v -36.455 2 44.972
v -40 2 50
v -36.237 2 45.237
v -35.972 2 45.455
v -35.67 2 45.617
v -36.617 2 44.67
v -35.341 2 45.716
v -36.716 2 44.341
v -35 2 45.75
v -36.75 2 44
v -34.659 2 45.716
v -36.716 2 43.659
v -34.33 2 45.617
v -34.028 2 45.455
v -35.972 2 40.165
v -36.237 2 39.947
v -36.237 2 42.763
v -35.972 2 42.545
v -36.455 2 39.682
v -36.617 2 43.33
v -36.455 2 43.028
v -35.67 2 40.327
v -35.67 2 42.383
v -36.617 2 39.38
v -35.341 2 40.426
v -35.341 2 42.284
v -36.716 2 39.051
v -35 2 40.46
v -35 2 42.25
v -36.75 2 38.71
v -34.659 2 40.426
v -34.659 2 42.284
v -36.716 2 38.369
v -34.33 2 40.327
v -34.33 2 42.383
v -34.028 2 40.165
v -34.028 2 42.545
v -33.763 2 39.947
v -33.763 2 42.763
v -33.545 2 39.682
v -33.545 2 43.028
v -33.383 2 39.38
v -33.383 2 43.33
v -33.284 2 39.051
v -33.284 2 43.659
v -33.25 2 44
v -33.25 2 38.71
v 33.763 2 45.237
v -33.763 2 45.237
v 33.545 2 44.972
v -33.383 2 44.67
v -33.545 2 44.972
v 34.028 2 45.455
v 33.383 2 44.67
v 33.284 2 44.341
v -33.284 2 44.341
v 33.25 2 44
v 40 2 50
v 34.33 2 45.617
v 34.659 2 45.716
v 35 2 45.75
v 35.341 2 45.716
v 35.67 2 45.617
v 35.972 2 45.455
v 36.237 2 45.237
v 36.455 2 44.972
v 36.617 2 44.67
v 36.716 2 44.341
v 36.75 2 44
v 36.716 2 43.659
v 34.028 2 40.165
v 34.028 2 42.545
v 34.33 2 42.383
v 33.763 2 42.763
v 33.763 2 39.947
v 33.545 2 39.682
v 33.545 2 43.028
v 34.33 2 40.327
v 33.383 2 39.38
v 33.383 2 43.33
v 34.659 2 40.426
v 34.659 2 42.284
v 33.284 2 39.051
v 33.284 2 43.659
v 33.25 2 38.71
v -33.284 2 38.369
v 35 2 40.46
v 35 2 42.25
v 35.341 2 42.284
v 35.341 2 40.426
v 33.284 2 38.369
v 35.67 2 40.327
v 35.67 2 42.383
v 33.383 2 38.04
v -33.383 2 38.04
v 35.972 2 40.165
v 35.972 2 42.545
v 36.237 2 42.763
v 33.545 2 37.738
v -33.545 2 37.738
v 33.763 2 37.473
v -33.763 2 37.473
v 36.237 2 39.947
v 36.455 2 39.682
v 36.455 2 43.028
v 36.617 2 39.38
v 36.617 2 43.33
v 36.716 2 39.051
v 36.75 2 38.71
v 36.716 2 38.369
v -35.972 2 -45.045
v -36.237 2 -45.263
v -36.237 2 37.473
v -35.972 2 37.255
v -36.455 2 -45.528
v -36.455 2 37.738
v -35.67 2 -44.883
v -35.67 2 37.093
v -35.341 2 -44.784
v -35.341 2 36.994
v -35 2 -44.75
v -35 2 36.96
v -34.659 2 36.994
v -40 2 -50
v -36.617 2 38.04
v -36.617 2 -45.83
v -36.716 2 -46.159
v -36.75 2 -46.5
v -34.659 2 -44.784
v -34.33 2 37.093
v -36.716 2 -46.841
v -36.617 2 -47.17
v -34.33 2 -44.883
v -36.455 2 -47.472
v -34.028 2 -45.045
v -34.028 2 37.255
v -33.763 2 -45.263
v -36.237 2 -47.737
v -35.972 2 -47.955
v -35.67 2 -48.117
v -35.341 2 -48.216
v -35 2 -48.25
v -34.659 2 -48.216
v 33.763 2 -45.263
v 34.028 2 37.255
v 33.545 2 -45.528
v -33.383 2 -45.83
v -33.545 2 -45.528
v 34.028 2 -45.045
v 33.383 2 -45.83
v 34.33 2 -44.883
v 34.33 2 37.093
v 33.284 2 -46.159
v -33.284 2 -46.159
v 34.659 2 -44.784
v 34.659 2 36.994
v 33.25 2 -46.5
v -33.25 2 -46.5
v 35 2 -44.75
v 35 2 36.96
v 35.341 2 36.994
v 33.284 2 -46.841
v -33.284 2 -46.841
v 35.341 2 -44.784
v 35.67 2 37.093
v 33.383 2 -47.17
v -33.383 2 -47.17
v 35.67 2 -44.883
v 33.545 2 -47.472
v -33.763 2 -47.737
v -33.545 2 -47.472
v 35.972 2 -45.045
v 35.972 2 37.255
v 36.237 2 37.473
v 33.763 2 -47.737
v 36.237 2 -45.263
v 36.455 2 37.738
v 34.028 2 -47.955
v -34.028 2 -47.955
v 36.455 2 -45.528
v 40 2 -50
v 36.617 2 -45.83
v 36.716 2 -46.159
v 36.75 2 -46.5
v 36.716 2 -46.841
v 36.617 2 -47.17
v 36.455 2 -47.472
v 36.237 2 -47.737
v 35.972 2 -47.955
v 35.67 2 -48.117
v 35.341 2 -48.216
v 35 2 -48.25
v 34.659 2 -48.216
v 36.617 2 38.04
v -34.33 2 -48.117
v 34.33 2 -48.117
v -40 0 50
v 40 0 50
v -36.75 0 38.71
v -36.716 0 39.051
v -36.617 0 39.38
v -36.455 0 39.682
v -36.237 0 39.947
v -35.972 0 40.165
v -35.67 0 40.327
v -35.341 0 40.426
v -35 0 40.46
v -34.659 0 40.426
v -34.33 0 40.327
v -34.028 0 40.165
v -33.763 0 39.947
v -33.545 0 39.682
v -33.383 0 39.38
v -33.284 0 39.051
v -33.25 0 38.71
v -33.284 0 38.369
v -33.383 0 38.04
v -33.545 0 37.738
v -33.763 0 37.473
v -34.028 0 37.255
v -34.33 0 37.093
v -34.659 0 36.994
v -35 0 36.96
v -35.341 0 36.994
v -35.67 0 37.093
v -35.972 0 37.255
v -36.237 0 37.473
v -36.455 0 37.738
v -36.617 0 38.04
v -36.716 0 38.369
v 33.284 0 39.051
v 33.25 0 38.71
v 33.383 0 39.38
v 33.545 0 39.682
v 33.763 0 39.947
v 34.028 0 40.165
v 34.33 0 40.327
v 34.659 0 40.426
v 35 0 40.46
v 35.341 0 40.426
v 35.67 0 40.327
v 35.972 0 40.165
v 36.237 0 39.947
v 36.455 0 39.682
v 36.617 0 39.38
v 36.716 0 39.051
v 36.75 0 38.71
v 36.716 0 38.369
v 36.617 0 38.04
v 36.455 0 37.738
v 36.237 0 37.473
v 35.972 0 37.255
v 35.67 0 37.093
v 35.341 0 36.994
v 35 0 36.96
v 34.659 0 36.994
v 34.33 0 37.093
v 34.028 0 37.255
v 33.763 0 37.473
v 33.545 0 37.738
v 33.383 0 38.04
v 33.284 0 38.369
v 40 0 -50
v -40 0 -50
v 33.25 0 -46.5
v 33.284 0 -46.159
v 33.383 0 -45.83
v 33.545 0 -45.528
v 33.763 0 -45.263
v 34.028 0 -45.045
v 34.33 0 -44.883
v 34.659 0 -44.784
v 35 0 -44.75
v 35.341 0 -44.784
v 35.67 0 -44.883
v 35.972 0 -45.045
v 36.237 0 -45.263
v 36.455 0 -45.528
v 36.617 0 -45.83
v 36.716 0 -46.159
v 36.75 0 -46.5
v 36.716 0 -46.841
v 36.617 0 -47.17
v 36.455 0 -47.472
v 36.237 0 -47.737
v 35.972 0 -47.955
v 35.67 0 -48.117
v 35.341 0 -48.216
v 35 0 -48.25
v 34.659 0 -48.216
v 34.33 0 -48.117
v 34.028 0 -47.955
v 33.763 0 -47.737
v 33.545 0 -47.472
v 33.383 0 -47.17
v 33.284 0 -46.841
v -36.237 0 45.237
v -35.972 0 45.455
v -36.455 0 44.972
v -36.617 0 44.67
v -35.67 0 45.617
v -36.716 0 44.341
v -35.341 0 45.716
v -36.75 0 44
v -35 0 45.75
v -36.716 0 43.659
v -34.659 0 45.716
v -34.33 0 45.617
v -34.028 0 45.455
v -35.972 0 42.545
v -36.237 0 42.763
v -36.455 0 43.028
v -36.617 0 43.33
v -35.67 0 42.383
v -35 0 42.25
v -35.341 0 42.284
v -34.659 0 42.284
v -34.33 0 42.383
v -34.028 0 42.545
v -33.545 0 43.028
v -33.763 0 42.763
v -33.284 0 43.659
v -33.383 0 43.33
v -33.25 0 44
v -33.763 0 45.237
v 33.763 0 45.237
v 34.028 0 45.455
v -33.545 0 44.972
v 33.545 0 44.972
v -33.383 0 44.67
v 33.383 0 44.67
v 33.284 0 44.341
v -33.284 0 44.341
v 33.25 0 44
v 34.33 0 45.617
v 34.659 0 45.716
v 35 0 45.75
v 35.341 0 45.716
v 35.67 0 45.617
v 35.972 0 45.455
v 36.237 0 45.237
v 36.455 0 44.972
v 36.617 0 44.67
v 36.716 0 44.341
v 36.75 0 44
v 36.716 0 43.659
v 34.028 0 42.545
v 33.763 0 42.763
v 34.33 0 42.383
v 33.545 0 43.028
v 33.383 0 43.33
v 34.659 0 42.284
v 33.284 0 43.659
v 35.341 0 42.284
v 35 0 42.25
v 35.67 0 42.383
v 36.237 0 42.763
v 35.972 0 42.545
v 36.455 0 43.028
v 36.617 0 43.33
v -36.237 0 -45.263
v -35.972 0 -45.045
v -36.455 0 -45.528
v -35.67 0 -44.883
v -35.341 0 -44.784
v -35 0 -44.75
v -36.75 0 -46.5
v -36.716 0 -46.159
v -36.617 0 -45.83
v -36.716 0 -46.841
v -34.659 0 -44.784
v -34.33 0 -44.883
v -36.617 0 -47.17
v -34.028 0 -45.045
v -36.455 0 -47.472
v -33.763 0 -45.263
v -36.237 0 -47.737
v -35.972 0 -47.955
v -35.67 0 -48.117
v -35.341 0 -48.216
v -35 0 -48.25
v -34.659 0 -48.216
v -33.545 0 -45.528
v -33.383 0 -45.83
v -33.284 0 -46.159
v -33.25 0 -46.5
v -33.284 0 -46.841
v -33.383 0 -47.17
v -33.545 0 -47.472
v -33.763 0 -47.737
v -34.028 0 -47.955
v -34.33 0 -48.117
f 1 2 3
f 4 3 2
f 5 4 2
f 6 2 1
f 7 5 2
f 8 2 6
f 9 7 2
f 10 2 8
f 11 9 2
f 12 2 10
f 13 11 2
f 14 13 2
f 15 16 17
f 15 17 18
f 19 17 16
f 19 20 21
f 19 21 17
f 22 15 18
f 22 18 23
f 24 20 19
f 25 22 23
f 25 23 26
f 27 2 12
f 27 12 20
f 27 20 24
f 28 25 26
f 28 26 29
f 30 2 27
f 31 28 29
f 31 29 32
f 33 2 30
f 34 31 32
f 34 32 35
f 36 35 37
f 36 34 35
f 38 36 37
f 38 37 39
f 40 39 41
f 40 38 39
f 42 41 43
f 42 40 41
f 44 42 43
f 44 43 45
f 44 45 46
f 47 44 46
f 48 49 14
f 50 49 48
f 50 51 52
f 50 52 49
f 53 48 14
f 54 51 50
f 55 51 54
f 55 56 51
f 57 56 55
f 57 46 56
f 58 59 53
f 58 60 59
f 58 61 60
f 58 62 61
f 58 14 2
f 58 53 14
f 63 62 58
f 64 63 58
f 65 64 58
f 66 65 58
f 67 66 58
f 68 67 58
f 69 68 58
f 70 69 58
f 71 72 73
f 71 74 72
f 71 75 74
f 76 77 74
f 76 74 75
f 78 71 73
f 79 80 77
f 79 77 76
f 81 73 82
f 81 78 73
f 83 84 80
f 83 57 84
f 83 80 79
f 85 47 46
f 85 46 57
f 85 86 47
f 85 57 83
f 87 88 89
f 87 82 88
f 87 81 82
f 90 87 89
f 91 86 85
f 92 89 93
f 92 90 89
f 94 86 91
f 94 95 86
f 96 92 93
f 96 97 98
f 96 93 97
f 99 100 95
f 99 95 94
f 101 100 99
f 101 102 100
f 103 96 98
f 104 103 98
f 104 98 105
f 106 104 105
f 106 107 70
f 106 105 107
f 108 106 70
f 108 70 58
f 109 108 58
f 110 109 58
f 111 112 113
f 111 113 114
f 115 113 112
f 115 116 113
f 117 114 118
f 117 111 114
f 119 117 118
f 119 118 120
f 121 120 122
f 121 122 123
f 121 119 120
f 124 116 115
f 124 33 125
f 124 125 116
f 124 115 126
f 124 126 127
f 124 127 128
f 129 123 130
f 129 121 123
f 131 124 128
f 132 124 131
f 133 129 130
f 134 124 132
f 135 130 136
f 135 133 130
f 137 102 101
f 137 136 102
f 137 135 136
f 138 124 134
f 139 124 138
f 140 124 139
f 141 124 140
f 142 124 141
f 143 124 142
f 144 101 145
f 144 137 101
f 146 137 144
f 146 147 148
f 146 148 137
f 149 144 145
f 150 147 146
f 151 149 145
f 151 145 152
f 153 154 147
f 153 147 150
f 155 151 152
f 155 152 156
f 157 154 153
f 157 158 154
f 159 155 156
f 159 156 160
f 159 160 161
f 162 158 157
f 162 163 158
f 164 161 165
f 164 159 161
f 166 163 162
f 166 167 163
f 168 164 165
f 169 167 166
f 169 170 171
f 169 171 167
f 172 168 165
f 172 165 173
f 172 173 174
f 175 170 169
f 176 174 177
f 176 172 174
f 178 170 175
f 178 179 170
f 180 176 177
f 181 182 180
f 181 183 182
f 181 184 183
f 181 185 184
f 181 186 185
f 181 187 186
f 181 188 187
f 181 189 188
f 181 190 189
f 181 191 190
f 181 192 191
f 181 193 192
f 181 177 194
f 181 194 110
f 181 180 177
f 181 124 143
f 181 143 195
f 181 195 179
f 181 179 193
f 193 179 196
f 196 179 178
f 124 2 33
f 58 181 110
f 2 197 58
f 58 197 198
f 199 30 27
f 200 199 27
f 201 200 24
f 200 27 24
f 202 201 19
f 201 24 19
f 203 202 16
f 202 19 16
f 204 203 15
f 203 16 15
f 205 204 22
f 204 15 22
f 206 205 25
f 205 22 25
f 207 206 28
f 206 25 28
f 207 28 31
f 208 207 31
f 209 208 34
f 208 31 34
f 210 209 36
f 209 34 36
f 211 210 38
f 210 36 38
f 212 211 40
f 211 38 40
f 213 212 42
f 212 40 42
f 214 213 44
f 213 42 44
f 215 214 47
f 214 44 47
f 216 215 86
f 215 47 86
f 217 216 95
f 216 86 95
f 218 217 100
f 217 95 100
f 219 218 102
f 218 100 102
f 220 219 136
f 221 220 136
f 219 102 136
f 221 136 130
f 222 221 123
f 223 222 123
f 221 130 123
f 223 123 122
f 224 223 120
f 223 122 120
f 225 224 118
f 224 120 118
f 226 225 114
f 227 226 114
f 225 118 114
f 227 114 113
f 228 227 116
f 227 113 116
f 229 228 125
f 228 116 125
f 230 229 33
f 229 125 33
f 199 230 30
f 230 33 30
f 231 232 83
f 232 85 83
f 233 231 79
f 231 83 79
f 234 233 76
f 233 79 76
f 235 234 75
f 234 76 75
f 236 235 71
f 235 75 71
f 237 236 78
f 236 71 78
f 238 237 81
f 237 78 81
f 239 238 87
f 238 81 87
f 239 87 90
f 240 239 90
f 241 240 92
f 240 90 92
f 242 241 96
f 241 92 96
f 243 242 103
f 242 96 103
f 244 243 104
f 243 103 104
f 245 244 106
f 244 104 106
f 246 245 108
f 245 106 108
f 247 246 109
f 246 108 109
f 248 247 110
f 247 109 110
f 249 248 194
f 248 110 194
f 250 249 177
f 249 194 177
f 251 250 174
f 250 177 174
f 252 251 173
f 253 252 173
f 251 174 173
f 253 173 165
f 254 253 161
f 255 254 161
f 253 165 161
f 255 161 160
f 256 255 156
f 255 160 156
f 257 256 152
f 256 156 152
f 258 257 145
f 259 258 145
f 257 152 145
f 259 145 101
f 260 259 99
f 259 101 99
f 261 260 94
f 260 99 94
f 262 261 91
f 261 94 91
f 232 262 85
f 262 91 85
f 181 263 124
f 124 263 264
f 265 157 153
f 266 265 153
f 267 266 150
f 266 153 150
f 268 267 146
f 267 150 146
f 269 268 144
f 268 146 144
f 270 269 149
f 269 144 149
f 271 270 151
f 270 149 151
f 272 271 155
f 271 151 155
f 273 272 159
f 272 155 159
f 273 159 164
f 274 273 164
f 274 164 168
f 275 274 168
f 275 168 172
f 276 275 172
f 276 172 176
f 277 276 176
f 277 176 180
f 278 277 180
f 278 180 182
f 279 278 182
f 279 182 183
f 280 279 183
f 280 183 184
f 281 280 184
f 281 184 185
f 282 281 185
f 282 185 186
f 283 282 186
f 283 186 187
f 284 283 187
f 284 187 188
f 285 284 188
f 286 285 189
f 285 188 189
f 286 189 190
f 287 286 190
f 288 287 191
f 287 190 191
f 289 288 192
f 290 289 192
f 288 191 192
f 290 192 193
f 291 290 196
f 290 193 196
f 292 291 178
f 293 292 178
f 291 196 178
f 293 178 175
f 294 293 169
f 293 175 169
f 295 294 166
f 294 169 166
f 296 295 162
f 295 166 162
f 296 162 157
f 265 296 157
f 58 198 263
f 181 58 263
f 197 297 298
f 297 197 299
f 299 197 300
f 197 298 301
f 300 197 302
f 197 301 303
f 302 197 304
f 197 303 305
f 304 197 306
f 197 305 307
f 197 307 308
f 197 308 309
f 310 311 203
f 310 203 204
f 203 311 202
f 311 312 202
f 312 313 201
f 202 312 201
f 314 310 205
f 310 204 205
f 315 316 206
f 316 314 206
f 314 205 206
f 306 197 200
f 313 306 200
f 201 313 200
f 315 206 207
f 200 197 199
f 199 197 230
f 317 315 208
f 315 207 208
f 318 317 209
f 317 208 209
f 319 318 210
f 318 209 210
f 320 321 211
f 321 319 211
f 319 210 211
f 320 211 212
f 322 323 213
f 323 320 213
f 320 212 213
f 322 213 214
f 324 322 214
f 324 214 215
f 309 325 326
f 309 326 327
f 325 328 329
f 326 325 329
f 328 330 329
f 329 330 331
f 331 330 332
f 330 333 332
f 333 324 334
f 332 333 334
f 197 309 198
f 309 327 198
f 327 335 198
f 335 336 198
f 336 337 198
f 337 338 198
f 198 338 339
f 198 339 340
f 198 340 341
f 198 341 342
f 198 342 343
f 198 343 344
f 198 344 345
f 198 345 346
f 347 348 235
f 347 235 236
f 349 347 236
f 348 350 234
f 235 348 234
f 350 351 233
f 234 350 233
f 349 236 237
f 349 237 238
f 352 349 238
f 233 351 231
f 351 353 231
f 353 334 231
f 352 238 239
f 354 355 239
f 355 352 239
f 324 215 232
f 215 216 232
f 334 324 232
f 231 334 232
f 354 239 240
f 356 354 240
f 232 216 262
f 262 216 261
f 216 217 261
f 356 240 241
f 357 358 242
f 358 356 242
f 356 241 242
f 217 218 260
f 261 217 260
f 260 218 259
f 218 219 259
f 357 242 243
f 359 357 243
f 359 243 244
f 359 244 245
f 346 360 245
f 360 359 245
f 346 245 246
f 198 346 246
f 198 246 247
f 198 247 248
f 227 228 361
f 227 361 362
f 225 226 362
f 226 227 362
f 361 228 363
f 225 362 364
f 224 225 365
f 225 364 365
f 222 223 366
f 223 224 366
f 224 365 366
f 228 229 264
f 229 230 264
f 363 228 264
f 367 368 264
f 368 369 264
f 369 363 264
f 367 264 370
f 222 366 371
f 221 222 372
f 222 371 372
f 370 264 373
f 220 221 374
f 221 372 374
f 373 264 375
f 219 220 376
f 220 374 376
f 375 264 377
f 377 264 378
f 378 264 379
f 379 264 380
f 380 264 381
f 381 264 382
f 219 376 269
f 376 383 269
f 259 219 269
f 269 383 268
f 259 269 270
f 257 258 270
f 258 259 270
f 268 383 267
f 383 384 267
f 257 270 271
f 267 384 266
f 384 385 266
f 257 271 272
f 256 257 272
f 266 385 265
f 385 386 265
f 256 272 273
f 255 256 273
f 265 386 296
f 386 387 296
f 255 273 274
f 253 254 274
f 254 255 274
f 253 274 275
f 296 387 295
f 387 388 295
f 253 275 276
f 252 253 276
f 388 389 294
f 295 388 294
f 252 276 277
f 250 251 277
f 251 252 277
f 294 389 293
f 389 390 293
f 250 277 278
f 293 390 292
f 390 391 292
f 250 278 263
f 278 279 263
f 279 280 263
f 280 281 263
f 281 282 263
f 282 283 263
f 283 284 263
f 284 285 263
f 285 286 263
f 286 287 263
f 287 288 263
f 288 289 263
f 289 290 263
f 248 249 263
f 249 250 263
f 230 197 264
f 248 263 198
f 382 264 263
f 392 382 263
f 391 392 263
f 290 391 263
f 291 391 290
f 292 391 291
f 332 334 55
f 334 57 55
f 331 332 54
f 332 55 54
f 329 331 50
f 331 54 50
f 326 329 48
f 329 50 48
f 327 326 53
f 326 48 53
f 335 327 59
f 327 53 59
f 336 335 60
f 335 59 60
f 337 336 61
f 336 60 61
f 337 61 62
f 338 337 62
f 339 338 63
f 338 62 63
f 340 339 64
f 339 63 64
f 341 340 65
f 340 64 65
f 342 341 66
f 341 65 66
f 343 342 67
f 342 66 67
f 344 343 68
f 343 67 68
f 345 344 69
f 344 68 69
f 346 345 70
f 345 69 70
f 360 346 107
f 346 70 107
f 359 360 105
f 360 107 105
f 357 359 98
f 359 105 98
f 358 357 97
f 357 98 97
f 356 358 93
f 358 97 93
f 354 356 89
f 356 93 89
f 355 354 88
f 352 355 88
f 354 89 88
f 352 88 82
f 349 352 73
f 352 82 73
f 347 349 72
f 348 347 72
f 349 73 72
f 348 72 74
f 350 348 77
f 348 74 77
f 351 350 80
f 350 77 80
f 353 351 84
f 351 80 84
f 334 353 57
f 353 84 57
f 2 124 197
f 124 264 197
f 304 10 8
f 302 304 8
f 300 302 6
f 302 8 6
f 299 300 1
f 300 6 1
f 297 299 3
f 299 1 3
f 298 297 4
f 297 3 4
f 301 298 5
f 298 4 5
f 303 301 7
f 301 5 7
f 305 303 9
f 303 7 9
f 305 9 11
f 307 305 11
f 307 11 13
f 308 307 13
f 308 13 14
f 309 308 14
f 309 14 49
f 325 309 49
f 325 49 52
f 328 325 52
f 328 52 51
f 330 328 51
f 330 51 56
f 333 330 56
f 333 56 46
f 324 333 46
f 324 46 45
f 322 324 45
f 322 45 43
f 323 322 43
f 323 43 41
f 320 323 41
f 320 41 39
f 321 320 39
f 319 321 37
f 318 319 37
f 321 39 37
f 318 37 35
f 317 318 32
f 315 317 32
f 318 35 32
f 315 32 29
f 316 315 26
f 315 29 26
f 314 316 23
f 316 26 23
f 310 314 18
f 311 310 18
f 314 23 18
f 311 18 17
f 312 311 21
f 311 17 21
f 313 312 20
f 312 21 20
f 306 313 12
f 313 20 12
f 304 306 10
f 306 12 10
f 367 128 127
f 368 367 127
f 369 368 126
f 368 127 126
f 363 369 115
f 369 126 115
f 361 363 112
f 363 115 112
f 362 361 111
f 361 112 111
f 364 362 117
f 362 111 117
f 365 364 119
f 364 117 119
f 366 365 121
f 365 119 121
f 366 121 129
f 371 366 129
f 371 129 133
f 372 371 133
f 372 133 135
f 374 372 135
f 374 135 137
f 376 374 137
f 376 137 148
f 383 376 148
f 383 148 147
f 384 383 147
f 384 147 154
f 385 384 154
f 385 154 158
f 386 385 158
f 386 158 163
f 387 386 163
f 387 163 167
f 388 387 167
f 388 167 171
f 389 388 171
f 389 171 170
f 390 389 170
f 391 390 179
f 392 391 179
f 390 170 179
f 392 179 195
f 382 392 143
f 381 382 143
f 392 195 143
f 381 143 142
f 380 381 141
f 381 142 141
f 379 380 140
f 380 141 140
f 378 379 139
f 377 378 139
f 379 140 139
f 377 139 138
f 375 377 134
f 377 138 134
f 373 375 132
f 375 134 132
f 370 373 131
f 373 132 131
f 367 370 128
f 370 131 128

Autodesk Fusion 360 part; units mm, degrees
sketch "スケッチ1" plane through (0, 0, 0) normal (0, 1, 0) x (1, 0, 0)
  line L0 (-40, -50) -> (40, -50)
  line L1 (40, -50) -> (40, 50)
  line L2 (40, 50) -> (-40, 50)
  line L3 (-40, 50) -> (-40, -50)
  line L4 (-40, -50) -> (40, 50) construction
  line L5 (40, -50) -> (-40, 50) construction
  dimension "d1" = 80
  dimension "d2" = 100
extrude "押し出し1" add sketch "スケッチ1" along normal blind 2
sketch "スケッチ2" plane through (0, 2, 0) normal (0, 1, 0) x (-1, 0, 0)
  line L0 (40, -50) -> (40, 50)
  line L1 (40, 50) -> (-40, 50)
  line L2 (-40, 50) -> (-40, -50)
  line L3 (-40, -50) -> (40, -50)
  line L4 (0, -50) -> (0, -46.5)
  line L5 (0, -46.5) -> (35, -46.5)
  line L6 (0, -46.5) -> (-35, -46.5)
  circle A0 centre (35, -46.5) radius 1.75
  circle A1 centre (-35, -46.5) radius 1.75
  line L7 (35, -46.5) -> (35, 44)
  circle A2 centre (35, 44) radius 1.75
  line L8 (35, 44) -> (-35, 44)
  circle A3 centre (-35, 44) radius 1.75
  dimension "d5" = 3.5
  dimension "d6" = 35
  dimension "d7" = 35
  dimension "d8" = 3.5
  dimension "d9" = 3.5
  dimension "d10" = 90.5
  dimension "d11" = 3.5
  dimension "d12" = 70
  dimension "d13" = 3.5
extrude "押し出し2" cut sketch "スケッチ2" against normal blind 5 contours A1 | A3 | L7 A2 L8 | L7 A2 L8 | L5 A0 L7 | L5 A0 L7
sketch "スケッチ3" plane through (0, 2, 0) normal (0, 1, 0) x (-1, 0, 0)
  circle A0 centre (35, -46.5) radius 1.75
  circle A1 centre (35, 44) radius 1.75
  circle A2 centre (-35, -46.5) radius 1.75
  circle A3 centre (-35, 44) radius 1.75
  line L0 (40, -50) -> (40, 50)
  line L1 (40, 50) -> (-40, 50)
  line L2 (-40, 50) -> (-40, -50)
  line L3 (-40, -50) -> (40, -50)
  line L4 (35, 44) -> (35, 38.71)
  line L5 (-35, 44) -> (-35, 38.71)
  circle A4 centre (35, 38.71) radius 1.75
  circle A5 centre (-35, 38.71) radius 1.75
  dimension "d16" = 5.29
  dimension "d17" = 5.29
  dimension "d18" = 3.5
  dimension "d19" = 3.5
extrude "押し出し3" cut sketch "スケッチ3" against normal blind 14 contours A4 | A5
